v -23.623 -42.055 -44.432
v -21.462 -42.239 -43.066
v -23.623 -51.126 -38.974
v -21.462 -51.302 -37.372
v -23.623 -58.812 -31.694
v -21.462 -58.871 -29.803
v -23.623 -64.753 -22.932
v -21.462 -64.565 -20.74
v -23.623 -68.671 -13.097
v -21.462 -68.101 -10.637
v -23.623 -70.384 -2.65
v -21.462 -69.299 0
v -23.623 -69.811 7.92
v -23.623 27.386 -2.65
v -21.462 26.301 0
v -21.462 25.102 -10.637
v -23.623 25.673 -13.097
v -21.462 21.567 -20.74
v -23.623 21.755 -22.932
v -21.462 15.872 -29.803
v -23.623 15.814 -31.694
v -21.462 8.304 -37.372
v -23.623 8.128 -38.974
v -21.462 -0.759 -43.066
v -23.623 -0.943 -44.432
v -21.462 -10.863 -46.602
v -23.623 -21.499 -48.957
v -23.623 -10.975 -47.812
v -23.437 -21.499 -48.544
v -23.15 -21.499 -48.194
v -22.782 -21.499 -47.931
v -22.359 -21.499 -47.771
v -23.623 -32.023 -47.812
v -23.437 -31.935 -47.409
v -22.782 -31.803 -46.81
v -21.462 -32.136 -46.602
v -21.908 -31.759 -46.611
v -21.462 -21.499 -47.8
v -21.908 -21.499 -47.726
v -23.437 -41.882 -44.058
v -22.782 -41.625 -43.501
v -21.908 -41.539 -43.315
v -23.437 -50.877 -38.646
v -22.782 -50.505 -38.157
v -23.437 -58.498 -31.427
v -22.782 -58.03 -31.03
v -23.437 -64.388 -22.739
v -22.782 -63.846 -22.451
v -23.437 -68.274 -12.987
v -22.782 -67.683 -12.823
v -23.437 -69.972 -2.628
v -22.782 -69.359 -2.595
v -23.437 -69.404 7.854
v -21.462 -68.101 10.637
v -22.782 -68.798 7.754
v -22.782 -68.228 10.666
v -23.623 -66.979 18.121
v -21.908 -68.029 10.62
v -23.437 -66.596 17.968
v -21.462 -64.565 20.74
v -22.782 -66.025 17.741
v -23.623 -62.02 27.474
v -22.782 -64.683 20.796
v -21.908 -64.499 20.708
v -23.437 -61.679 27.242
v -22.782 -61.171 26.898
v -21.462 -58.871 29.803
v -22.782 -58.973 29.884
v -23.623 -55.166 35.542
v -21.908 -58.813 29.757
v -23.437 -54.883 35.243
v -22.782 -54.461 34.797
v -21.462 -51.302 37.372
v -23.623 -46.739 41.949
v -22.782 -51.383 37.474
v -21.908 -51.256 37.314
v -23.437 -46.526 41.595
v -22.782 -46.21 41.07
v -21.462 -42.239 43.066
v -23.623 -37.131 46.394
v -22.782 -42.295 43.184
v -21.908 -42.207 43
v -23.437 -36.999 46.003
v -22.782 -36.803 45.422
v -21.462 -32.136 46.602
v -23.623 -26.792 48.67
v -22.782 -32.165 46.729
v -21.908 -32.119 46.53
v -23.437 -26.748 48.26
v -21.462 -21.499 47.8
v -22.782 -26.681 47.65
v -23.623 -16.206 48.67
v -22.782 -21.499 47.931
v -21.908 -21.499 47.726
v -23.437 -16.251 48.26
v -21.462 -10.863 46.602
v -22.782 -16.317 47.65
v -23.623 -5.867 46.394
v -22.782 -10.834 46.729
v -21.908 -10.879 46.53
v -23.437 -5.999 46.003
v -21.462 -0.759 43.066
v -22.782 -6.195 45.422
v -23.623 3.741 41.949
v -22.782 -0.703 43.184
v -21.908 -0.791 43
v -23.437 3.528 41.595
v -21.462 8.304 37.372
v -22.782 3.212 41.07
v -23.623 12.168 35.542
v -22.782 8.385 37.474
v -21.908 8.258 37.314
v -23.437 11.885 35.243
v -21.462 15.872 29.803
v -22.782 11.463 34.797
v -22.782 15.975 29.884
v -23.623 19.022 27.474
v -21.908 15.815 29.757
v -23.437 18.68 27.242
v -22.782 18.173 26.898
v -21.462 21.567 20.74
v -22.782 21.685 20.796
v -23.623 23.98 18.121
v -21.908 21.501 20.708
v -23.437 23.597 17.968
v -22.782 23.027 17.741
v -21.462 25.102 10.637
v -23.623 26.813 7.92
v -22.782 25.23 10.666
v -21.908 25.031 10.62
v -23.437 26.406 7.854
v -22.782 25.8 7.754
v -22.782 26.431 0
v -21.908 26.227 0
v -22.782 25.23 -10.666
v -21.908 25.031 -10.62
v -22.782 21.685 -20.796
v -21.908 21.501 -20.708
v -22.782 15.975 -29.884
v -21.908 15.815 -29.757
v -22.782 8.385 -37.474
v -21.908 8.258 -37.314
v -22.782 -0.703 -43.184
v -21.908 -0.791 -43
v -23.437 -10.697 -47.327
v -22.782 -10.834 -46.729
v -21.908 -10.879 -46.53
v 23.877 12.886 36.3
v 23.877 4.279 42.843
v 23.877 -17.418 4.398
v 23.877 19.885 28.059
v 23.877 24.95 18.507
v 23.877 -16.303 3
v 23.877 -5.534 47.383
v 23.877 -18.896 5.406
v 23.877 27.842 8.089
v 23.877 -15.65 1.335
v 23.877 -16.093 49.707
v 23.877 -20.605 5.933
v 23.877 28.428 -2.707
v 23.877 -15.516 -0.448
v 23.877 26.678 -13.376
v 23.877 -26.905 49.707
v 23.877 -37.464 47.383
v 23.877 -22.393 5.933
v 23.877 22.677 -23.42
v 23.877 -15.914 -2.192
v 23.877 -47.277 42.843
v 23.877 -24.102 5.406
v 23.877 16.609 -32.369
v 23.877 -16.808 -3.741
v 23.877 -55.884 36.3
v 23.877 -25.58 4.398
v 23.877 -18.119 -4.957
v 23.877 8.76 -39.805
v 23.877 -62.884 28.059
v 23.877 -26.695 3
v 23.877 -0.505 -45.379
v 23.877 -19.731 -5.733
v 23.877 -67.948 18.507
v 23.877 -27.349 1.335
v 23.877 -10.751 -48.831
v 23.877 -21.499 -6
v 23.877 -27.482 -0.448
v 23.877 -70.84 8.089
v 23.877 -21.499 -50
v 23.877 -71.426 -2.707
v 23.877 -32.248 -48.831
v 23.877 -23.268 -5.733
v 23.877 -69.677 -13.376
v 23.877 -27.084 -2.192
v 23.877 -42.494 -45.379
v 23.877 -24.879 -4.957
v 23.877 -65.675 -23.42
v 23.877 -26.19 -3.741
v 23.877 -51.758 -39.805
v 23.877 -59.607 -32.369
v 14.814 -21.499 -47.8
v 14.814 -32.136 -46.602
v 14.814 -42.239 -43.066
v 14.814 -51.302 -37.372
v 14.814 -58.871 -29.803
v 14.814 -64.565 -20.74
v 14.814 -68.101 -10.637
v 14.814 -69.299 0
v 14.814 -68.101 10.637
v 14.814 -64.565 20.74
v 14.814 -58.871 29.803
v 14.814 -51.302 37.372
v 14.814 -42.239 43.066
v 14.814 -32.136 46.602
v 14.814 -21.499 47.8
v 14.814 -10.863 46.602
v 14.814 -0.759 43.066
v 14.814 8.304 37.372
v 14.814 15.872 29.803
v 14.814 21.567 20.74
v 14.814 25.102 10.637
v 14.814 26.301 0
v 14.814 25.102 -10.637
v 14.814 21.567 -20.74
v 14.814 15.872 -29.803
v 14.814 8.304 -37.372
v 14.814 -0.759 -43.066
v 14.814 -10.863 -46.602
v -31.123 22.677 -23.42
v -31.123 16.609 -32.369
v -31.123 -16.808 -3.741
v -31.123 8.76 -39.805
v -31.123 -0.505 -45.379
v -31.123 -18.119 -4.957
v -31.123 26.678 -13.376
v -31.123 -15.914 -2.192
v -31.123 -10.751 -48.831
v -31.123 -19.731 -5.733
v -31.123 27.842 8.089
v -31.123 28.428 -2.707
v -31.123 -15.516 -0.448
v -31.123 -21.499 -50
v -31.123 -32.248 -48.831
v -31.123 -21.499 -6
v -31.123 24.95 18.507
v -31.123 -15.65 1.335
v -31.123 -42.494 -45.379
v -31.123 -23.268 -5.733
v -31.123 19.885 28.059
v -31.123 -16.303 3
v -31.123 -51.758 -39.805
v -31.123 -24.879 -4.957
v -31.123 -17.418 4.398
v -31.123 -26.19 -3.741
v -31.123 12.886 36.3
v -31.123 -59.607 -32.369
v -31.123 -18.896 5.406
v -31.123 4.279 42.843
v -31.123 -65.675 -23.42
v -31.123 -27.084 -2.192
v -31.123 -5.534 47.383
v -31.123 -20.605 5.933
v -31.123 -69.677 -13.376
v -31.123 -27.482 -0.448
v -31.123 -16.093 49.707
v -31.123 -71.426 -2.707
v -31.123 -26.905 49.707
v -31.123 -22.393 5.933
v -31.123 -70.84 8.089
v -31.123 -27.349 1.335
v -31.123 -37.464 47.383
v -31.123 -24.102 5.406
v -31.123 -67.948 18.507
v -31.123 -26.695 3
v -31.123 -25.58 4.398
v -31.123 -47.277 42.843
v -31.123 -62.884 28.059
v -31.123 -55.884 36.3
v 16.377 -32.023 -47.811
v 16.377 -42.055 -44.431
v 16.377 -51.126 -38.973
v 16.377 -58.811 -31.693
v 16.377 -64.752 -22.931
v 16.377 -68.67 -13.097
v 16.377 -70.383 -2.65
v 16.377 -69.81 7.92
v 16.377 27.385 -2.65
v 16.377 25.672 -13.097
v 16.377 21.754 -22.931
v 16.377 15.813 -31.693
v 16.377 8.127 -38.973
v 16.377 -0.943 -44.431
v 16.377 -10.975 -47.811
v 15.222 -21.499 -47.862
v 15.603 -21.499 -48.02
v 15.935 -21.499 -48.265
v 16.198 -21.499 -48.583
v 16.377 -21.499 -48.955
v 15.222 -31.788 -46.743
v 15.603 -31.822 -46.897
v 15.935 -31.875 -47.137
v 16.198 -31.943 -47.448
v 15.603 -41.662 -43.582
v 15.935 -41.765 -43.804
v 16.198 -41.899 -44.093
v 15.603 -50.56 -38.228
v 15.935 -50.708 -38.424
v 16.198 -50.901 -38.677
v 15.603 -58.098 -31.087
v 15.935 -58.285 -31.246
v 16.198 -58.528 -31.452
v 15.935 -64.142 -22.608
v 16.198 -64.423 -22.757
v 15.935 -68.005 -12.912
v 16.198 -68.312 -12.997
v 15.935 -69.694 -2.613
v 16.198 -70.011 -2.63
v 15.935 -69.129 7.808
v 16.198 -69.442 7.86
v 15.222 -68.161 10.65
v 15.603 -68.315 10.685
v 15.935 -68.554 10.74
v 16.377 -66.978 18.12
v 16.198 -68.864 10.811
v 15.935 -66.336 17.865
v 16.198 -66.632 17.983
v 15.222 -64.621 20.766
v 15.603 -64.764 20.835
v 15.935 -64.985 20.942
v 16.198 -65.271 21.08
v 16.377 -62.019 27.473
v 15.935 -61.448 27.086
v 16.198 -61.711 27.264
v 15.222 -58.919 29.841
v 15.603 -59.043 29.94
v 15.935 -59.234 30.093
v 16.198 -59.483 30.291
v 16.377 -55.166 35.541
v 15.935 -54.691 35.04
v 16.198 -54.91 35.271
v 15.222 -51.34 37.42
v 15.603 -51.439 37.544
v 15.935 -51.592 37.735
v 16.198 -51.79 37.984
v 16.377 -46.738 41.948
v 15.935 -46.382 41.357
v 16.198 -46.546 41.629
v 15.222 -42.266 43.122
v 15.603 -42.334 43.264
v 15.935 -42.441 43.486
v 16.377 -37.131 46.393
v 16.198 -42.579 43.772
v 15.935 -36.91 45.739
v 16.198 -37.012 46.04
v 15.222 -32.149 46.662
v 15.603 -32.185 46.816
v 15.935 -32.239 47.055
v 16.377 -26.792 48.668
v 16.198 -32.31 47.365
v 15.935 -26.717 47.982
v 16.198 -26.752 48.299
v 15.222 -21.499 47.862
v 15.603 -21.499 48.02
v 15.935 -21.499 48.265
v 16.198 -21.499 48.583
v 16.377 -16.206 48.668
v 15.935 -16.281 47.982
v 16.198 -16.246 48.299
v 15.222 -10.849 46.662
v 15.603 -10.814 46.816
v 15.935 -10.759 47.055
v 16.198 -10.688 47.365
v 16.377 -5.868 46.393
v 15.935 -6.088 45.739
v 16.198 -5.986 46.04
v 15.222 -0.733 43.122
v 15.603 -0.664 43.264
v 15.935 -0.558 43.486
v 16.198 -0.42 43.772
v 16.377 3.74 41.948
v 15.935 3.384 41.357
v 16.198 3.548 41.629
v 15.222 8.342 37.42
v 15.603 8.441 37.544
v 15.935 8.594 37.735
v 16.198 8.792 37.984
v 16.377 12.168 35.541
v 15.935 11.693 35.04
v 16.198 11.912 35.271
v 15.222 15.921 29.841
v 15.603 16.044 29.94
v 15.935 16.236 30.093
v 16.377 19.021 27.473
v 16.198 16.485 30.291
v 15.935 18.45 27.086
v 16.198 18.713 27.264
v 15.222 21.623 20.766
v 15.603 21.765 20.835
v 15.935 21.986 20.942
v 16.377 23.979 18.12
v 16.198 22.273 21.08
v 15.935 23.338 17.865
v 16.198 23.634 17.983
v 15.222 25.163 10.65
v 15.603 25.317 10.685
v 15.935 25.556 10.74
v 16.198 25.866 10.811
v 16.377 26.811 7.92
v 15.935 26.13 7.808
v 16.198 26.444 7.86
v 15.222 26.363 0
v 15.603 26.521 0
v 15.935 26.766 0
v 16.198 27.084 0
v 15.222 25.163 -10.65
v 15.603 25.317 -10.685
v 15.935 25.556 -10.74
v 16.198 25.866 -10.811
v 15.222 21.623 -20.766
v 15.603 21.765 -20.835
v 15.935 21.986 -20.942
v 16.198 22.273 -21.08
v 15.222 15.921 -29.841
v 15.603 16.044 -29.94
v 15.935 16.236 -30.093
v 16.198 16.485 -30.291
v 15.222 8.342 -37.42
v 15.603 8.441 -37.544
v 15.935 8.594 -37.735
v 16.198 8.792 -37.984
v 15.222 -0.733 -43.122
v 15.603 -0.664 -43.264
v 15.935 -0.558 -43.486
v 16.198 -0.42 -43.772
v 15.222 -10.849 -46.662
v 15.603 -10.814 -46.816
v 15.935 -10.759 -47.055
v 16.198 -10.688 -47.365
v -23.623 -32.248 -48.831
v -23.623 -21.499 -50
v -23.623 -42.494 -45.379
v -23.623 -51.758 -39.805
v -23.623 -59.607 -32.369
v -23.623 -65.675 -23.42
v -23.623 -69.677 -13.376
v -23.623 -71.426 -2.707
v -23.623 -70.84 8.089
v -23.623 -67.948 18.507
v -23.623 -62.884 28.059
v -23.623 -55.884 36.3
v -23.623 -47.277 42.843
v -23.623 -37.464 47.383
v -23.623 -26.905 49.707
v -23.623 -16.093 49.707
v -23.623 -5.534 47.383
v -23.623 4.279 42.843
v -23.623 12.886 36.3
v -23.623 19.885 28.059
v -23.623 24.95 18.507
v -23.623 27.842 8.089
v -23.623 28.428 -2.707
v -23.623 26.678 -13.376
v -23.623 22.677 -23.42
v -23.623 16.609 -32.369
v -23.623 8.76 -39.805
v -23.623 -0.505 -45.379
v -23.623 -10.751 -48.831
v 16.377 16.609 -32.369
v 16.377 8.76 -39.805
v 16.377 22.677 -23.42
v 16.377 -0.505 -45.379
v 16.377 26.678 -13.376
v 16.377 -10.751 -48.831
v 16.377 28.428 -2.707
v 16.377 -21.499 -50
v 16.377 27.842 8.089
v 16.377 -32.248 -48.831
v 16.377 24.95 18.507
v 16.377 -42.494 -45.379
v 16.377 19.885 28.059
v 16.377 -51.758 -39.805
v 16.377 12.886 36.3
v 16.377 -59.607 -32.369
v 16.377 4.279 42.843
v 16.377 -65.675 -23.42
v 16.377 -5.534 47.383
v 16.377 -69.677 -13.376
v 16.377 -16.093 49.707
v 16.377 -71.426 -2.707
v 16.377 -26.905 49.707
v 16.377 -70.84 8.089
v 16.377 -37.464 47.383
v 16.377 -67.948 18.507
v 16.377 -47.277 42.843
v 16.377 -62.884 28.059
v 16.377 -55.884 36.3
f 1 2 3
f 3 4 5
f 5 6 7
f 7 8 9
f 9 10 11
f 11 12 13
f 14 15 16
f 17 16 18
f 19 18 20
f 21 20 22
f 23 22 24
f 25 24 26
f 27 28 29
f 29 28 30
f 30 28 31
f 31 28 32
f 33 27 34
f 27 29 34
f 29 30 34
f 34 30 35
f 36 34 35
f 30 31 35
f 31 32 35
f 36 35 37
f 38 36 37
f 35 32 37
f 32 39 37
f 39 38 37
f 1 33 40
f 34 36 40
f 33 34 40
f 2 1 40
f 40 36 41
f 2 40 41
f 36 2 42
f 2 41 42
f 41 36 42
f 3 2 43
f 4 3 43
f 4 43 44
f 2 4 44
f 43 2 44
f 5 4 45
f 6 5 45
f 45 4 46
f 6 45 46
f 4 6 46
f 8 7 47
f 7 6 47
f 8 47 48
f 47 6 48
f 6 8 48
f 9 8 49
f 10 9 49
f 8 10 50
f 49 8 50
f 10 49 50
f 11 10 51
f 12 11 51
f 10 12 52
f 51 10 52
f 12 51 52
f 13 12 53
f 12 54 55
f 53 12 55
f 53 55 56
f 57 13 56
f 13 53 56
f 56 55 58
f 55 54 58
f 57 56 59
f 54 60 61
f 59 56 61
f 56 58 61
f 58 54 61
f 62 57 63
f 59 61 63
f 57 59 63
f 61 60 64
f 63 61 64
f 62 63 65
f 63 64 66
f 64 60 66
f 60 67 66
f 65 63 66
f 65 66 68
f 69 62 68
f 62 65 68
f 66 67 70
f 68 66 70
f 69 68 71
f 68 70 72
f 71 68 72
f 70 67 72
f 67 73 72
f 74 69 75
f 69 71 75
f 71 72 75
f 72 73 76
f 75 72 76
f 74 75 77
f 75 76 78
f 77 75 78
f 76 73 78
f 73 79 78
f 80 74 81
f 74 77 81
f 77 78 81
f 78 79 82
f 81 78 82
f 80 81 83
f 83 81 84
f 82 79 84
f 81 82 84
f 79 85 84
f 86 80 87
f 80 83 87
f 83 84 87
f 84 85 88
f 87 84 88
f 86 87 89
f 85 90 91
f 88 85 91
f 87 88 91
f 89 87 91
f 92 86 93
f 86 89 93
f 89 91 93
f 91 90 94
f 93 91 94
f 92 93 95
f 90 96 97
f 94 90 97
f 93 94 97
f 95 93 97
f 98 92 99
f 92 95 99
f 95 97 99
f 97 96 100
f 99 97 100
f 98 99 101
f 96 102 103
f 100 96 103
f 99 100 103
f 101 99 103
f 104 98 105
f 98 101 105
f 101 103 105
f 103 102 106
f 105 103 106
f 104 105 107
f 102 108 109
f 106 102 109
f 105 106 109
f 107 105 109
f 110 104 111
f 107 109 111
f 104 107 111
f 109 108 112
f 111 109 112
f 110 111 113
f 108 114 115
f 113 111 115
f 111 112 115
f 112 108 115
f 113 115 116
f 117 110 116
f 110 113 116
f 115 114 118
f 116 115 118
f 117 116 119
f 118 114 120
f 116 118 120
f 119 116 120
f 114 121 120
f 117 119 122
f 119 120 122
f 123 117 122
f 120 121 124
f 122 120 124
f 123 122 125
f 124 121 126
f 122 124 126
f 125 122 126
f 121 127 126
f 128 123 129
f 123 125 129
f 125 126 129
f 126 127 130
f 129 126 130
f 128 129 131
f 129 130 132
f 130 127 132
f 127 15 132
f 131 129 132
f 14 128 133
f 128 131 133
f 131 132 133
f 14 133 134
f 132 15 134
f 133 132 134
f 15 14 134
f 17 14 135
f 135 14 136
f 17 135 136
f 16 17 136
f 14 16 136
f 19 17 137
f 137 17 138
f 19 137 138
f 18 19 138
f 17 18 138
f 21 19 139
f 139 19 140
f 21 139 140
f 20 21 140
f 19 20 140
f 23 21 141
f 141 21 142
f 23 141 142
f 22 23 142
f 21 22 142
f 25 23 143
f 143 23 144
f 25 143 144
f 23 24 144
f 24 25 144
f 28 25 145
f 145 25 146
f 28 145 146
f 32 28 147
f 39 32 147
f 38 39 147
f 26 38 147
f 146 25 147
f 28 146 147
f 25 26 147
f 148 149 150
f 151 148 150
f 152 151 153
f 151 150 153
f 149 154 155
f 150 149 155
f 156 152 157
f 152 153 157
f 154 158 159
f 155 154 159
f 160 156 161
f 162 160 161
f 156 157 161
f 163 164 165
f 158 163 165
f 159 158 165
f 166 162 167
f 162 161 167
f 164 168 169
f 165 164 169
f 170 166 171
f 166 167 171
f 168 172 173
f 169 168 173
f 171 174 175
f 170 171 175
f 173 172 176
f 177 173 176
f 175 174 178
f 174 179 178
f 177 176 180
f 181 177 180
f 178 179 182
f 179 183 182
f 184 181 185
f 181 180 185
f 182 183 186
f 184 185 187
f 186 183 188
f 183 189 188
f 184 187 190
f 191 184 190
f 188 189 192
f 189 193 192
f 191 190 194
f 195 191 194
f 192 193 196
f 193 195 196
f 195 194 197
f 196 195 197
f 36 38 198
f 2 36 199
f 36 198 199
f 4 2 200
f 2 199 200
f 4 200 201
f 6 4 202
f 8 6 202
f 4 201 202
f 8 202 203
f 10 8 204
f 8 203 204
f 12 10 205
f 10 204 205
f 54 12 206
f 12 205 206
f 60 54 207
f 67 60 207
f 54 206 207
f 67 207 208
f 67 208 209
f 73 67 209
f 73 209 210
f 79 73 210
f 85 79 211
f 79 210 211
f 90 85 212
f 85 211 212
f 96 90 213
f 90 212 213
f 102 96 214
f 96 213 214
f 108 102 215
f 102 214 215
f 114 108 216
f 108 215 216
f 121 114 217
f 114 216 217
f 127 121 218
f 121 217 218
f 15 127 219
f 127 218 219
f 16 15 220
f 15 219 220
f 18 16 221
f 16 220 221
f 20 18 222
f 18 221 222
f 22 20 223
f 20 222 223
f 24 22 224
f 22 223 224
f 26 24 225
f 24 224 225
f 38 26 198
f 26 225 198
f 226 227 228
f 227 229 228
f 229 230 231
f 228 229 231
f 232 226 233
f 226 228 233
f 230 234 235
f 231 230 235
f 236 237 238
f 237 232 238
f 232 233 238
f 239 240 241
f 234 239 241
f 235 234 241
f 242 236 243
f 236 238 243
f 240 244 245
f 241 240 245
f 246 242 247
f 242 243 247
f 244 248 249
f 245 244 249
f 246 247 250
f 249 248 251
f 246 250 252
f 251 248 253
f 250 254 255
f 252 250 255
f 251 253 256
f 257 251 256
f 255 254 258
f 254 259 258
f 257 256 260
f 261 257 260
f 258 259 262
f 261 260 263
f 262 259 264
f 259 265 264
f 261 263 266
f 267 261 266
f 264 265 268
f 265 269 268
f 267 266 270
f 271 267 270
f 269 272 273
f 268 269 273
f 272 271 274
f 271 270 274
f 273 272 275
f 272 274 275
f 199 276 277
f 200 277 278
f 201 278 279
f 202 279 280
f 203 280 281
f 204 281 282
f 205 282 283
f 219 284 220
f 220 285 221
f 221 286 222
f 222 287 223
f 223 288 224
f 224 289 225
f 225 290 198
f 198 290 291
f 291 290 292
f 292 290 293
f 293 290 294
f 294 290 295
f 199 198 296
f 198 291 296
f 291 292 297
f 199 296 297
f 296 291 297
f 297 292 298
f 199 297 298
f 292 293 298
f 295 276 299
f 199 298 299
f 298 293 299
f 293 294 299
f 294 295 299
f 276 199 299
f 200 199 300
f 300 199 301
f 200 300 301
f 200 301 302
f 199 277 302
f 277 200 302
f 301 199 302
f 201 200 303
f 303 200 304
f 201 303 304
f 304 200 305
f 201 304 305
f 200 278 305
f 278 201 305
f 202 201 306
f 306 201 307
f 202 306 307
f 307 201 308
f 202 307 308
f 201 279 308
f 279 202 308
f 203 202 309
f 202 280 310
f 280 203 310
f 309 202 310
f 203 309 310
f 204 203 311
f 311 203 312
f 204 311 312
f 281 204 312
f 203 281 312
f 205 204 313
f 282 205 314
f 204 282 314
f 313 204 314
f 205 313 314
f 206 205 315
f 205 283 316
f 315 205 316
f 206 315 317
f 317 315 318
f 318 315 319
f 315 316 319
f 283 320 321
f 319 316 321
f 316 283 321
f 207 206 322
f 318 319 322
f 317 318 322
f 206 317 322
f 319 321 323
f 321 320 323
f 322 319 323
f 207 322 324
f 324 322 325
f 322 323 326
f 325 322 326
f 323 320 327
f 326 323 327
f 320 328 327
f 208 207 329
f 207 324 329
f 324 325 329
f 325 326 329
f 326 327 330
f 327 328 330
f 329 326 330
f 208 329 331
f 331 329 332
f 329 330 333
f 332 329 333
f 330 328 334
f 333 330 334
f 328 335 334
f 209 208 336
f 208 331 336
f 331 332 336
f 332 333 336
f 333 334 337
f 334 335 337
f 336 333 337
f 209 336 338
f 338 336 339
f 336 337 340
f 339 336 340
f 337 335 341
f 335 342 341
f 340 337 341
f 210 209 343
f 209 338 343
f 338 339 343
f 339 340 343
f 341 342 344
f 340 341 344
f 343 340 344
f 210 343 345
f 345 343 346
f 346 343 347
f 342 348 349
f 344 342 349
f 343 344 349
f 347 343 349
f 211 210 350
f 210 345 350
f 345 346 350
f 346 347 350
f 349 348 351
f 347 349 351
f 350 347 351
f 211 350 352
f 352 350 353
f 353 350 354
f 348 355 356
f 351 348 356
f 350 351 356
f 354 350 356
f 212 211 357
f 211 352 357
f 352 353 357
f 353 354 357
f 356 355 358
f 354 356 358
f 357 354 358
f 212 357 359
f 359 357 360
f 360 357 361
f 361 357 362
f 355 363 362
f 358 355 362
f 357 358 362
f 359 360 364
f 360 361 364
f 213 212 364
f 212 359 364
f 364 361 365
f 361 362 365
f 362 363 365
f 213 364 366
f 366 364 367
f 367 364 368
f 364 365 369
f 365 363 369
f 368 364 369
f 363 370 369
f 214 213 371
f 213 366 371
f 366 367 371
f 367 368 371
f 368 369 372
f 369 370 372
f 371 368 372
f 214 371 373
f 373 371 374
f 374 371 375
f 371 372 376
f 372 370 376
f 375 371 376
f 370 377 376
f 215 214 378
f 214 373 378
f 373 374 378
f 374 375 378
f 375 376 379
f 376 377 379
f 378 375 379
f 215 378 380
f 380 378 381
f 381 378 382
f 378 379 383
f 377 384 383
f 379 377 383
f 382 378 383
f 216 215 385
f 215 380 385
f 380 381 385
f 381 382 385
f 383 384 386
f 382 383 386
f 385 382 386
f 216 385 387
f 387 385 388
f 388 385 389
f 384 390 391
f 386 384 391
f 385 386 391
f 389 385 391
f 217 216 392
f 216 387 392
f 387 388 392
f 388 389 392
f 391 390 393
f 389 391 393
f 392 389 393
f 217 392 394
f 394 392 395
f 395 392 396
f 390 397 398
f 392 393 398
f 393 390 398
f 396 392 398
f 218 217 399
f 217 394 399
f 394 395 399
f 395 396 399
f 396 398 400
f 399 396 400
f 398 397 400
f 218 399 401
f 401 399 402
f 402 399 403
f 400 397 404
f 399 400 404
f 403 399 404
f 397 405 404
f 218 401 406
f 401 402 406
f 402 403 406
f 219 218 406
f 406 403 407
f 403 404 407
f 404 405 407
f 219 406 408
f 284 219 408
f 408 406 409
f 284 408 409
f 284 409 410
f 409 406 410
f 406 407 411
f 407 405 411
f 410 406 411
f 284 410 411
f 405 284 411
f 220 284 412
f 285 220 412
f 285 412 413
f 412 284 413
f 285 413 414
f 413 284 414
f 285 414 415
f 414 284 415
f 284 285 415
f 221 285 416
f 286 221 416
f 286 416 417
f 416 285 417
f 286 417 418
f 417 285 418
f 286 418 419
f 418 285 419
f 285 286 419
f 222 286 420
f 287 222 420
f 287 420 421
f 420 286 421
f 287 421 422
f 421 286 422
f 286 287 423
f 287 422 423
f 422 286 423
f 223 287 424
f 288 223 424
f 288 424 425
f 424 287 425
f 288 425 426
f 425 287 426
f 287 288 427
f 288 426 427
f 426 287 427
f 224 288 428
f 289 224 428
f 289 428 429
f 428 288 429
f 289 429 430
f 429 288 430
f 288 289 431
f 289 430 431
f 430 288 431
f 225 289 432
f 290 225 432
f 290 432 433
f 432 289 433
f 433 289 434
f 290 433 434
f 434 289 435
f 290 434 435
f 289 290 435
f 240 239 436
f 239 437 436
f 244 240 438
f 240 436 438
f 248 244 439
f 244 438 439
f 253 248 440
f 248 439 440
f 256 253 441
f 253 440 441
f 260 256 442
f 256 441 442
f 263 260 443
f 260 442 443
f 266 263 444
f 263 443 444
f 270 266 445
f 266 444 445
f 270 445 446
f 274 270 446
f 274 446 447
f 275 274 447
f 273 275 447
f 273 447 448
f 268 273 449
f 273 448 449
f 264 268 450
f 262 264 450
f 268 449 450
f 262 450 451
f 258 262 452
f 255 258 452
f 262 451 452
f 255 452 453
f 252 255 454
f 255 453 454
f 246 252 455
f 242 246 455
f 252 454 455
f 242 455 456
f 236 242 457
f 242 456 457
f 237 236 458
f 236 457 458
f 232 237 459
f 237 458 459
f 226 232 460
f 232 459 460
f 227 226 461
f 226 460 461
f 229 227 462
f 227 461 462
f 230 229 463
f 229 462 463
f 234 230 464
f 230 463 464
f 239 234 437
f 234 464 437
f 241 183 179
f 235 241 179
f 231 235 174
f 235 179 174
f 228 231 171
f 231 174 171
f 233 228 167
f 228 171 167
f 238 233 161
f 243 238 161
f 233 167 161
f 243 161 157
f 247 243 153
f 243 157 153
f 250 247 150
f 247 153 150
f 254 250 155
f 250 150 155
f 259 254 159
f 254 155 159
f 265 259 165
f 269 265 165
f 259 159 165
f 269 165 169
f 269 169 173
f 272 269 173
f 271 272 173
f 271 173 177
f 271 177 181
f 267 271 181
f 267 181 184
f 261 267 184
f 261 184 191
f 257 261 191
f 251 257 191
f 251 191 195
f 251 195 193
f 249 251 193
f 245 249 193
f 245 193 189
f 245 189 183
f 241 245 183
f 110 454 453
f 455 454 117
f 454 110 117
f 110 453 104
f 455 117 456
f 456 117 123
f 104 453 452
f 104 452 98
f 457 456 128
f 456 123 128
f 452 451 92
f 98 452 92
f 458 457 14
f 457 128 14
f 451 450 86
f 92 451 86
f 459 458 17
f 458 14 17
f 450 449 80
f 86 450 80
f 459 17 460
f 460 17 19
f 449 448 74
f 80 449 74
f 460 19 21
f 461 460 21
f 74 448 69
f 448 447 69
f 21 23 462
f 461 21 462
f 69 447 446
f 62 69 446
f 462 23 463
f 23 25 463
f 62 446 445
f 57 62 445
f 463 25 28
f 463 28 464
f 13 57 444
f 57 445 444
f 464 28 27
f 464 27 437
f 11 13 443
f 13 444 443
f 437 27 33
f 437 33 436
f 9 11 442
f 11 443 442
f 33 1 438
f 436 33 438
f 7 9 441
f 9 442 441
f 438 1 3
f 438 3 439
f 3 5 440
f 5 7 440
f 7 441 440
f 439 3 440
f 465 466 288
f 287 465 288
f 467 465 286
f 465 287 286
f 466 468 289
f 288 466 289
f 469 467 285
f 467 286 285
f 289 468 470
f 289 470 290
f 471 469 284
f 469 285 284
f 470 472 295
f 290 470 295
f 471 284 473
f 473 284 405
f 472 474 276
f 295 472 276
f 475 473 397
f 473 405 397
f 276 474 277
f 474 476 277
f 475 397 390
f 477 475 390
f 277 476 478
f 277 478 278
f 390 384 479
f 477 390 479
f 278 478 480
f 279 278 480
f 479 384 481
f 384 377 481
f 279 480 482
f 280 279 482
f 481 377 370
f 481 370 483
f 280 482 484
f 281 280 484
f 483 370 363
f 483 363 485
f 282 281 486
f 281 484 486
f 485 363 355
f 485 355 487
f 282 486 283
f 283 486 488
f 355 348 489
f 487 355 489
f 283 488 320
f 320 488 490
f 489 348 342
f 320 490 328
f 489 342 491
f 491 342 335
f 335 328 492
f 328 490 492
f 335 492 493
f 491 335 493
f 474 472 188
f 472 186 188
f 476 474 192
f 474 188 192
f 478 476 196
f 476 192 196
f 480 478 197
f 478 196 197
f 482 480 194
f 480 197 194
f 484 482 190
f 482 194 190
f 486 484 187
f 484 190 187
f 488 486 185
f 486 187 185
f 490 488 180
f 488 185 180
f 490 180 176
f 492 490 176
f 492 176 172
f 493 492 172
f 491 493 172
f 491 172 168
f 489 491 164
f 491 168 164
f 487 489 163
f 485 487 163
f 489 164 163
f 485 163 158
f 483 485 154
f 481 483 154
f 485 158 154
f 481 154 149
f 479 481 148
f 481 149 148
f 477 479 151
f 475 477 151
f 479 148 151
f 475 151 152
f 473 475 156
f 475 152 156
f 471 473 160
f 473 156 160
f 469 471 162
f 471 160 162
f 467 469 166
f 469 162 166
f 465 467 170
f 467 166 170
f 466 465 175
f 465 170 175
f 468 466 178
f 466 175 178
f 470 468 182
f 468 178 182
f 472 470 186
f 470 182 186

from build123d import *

# Parameters (mm, degrees)
SKETCH3_R          = 6
CUT_EXTRUDE1_DEPTH = 104.136405777


with BuildPart() as part:
    # Sketch1 → Revolve1 (revolve)
    with BuildSketch(Plane.XY, mode=Mode.PRIVATE) as revolve1_sk:
        with BuildLine():
            Line((23.876500295, 28.500921708), (23.876500295, -21.499078292))
            Line((23.876500295, -21.499078292), (19.38343903, -21.499078292))
            Line((19.38343903, -21.499078292), (-23.623499705, -21.499078292))
            Line((-23.623499705, -21.499078292), (-31.123499705, -21.499078292))
            Line((-31.123499705, -21.499078292), (-31.123499705, 20.226597036))
            Line((-31.123499705, 20.226597036), (-31.123499705, 28.500921708))
            Line((-31.123499705, 28.500921708), (-23.623499705, 28.500921708))
            Line((-23.623499705, 28.500921708), (-23.623499705, 27.45743453))
            ThreePointArc((-23.623499705, 27.45743453), (-22.782204784, 26.431489238), (-21.461866567, 26.300921708))
            Line((-21.461866567, 26.300921708), (-3.623499705, 26.300921708))
            Line((-3.623499705, 26.300921708), (14.814368071, 26.300921708))
            ThreePointArc((14.814368071, 26.300921708), (15.776775387, 26.633474133), (16.376500295, 27.456364765))
            Line((16.376500295, 27.456364765), (16.376500295, 28.500921708))
            Line((16.376500295, 28.500921708), (23.876500295, 28.500921708))
        make_face()
    revolve(revolve1_sk.sketch.rotate(Axis((23.876500295, -21.499078292, 0), (-1, 0, 0)), 90), axis=Axis((23.876500295, -21.499078292, 0), (-1, 0, 0)))

    # Sketch3 → Cut-Extrude1 (cut, through all)
    with BuildSketch(Plane(origin=(23.876500295, 0, 0), x_dir=(0, 0, -1), z_dir=(1, 0, 0))):
        with Locations((0, -21.499078292)):
            Circle(SKETCH3_R)
    extrude(amount=-CUT_EXTRUDE1_DEPTH, mode=Mode.SUBTRACT)


solid = part.part
